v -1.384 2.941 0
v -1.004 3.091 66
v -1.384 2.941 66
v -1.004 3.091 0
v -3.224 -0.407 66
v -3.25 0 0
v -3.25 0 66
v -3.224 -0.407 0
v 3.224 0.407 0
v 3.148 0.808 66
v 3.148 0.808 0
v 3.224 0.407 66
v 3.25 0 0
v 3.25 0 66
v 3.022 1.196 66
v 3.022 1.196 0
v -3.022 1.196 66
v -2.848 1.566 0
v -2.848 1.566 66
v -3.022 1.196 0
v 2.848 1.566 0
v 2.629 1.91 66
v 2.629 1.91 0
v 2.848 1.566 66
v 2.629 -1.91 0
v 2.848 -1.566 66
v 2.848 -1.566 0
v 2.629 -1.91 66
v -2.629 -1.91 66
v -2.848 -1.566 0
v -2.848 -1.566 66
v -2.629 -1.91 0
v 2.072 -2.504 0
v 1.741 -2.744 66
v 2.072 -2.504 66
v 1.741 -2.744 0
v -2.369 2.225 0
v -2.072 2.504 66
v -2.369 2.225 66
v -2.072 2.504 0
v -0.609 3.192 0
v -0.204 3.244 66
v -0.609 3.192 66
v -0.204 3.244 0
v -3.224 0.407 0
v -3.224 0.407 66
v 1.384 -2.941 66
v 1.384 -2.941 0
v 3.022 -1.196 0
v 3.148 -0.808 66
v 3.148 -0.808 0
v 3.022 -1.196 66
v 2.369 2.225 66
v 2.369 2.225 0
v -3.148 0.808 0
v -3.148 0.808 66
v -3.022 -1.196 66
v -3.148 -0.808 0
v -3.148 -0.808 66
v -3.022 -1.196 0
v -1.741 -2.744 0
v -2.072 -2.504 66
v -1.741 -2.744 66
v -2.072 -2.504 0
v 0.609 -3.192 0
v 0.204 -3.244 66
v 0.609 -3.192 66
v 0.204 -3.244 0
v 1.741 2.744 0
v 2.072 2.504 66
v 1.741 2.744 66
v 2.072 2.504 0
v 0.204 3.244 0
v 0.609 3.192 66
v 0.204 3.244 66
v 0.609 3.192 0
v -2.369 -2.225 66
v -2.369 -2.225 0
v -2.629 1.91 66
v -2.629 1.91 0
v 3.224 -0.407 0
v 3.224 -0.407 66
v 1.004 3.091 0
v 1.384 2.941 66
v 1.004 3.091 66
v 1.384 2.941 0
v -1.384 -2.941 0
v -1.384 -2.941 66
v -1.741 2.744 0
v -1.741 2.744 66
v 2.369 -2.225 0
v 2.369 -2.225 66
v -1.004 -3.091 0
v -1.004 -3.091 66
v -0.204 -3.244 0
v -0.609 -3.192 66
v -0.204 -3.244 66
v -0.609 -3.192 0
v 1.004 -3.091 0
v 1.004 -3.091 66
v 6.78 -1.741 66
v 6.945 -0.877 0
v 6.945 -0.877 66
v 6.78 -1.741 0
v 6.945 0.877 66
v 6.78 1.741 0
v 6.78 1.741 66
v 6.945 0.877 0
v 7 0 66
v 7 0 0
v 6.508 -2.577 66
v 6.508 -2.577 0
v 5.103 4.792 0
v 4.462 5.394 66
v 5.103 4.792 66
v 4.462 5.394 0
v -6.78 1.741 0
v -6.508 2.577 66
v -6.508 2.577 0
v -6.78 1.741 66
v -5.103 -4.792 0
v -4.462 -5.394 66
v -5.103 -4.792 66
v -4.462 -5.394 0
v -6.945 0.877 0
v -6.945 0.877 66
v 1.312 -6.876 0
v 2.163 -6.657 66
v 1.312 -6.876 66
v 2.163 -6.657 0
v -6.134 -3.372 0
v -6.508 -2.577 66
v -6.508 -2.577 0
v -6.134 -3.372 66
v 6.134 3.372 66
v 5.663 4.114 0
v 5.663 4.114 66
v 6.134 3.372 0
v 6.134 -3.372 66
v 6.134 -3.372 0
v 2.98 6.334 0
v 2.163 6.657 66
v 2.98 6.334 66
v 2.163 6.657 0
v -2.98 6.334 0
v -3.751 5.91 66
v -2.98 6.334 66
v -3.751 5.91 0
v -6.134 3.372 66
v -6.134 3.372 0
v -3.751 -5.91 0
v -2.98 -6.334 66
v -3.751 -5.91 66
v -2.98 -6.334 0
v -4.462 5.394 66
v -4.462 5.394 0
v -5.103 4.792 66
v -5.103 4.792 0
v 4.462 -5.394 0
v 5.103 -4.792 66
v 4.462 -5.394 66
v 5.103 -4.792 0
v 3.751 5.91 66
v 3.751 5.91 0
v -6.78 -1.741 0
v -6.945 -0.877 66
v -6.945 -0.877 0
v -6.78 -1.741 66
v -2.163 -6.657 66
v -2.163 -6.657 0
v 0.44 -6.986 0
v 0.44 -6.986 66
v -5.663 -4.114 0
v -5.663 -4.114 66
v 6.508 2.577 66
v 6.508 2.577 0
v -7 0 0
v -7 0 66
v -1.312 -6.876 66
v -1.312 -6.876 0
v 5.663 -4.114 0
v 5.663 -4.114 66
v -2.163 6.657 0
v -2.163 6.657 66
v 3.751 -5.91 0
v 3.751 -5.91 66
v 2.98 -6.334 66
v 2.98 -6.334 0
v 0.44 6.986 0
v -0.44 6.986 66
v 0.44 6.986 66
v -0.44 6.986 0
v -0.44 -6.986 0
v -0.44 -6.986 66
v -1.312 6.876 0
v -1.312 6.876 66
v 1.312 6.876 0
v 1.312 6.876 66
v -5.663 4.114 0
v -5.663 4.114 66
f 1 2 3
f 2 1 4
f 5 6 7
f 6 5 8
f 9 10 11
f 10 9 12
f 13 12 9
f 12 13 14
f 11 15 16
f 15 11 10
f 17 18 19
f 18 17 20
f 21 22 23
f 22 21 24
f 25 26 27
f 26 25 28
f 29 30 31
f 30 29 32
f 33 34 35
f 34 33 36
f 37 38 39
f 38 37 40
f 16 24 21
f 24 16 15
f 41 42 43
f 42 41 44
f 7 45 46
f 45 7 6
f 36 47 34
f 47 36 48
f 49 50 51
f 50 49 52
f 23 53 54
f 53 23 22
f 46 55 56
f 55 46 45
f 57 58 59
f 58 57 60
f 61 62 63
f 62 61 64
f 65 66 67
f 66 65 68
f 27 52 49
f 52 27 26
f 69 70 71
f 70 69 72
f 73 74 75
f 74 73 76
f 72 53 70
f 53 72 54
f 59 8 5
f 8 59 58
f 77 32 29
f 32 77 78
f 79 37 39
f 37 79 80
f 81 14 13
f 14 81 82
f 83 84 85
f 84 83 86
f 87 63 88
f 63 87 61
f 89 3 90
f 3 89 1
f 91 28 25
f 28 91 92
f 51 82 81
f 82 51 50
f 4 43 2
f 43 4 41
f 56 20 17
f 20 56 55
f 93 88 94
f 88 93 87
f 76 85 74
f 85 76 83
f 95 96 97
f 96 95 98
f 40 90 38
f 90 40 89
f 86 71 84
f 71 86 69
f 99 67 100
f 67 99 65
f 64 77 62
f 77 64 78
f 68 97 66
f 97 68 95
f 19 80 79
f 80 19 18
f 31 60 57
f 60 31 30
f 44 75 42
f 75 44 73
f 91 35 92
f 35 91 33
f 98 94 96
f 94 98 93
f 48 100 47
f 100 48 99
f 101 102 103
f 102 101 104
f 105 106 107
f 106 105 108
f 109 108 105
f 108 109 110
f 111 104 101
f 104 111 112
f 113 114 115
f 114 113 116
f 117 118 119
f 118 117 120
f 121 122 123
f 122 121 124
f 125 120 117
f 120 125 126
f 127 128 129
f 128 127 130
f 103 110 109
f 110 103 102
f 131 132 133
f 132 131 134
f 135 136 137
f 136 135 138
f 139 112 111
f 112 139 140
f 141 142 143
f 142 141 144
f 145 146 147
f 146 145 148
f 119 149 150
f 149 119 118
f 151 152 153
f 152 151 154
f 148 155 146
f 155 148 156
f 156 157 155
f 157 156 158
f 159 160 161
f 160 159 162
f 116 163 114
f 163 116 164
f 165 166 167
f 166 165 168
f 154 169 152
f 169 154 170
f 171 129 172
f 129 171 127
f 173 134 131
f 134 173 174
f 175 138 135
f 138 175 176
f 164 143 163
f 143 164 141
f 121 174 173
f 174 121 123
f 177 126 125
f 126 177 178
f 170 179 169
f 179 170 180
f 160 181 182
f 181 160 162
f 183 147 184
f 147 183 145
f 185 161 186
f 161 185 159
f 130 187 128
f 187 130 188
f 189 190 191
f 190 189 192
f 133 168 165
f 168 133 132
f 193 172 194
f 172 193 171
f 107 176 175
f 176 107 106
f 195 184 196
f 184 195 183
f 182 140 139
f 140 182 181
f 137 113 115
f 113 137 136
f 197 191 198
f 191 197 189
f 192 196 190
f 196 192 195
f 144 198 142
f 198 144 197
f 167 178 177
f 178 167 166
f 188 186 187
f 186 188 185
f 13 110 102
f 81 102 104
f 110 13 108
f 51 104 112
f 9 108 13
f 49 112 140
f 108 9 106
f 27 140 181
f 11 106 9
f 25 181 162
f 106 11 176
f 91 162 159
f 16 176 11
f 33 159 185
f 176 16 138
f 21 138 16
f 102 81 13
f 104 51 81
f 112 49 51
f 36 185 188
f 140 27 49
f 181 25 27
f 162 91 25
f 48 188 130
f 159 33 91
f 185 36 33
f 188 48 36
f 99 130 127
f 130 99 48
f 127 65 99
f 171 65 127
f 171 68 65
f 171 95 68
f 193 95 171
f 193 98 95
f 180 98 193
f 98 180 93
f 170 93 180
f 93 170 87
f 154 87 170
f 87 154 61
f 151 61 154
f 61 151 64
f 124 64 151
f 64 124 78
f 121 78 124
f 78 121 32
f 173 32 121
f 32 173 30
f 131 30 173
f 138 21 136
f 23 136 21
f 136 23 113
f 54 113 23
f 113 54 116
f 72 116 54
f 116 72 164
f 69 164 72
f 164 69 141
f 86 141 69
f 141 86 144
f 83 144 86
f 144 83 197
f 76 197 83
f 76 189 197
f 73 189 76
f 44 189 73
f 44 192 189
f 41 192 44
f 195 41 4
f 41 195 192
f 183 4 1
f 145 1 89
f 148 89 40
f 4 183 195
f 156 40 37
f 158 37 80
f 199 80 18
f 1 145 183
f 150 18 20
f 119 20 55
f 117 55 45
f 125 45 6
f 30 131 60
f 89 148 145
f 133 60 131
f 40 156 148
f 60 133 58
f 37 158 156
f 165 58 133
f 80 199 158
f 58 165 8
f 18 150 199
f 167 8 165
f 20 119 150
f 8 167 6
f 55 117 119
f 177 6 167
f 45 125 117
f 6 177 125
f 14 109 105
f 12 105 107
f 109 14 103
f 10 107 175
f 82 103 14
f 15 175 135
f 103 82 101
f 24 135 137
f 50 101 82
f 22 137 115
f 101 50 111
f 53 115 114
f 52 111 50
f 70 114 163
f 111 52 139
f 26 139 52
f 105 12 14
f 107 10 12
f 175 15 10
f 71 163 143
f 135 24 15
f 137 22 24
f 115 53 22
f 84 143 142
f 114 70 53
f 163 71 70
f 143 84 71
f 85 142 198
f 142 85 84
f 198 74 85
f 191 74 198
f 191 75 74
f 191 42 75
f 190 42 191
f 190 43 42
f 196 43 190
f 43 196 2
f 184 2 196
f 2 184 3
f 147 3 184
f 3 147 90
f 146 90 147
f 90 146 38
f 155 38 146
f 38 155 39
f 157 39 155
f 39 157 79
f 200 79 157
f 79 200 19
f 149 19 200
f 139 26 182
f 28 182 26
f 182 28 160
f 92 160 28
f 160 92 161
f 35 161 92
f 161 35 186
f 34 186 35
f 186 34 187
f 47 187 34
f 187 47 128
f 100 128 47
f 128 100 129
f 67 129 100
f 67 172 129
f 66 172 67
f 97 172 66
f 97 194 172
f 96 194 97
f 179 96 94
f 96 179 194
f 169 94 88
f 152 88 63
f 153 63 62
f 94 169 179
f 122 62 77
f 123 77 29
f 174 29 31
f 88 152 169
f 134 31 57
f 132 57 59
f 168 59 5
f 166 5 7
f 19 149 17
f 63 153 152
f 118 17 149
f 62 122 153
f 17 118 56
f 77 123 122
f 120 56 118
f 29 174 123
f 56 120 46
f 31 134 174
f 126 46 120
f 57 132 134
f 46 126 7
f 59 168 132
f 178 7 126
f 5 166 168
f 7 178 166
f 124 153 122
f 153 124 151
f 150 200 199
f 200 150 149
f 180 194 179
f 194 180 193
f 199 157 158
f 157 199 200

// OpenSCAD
$fn = 50;


difference() {
	union() {
		*color(alpha = 1.0000000000, c = "gray") {
			translate(v = [0, 7, 0]) {
				linear_extrude(height = 1) {
					text(font = "Arial:style=Bold", halign = "center", size = 4.5000000000, text = "COMMENT plate main", valign = "center");
				}
			}
		}
		cylinder(h = 66, r = 7.0000000000);
	}
	union() {
		*color(alpha = 1.0000000000, c = "gray") {
			translate(v = [0, 7, 0]) {
				linear_extrude(height = 1) {
					text(font = "Arial:style=Bold", halign = "center", size = 4.5000000000, text = "COMMENT holes main", valign = "center");
				}
			}
		}
		translate(v = [0, 0, -100]) {
			cylinder(h = 200, r = 3.2500000000);
		}
		translate(v = [0, 0, -100]) {
			cylinder(h = 200, r = 1.8000000000);
		}
	}
}
